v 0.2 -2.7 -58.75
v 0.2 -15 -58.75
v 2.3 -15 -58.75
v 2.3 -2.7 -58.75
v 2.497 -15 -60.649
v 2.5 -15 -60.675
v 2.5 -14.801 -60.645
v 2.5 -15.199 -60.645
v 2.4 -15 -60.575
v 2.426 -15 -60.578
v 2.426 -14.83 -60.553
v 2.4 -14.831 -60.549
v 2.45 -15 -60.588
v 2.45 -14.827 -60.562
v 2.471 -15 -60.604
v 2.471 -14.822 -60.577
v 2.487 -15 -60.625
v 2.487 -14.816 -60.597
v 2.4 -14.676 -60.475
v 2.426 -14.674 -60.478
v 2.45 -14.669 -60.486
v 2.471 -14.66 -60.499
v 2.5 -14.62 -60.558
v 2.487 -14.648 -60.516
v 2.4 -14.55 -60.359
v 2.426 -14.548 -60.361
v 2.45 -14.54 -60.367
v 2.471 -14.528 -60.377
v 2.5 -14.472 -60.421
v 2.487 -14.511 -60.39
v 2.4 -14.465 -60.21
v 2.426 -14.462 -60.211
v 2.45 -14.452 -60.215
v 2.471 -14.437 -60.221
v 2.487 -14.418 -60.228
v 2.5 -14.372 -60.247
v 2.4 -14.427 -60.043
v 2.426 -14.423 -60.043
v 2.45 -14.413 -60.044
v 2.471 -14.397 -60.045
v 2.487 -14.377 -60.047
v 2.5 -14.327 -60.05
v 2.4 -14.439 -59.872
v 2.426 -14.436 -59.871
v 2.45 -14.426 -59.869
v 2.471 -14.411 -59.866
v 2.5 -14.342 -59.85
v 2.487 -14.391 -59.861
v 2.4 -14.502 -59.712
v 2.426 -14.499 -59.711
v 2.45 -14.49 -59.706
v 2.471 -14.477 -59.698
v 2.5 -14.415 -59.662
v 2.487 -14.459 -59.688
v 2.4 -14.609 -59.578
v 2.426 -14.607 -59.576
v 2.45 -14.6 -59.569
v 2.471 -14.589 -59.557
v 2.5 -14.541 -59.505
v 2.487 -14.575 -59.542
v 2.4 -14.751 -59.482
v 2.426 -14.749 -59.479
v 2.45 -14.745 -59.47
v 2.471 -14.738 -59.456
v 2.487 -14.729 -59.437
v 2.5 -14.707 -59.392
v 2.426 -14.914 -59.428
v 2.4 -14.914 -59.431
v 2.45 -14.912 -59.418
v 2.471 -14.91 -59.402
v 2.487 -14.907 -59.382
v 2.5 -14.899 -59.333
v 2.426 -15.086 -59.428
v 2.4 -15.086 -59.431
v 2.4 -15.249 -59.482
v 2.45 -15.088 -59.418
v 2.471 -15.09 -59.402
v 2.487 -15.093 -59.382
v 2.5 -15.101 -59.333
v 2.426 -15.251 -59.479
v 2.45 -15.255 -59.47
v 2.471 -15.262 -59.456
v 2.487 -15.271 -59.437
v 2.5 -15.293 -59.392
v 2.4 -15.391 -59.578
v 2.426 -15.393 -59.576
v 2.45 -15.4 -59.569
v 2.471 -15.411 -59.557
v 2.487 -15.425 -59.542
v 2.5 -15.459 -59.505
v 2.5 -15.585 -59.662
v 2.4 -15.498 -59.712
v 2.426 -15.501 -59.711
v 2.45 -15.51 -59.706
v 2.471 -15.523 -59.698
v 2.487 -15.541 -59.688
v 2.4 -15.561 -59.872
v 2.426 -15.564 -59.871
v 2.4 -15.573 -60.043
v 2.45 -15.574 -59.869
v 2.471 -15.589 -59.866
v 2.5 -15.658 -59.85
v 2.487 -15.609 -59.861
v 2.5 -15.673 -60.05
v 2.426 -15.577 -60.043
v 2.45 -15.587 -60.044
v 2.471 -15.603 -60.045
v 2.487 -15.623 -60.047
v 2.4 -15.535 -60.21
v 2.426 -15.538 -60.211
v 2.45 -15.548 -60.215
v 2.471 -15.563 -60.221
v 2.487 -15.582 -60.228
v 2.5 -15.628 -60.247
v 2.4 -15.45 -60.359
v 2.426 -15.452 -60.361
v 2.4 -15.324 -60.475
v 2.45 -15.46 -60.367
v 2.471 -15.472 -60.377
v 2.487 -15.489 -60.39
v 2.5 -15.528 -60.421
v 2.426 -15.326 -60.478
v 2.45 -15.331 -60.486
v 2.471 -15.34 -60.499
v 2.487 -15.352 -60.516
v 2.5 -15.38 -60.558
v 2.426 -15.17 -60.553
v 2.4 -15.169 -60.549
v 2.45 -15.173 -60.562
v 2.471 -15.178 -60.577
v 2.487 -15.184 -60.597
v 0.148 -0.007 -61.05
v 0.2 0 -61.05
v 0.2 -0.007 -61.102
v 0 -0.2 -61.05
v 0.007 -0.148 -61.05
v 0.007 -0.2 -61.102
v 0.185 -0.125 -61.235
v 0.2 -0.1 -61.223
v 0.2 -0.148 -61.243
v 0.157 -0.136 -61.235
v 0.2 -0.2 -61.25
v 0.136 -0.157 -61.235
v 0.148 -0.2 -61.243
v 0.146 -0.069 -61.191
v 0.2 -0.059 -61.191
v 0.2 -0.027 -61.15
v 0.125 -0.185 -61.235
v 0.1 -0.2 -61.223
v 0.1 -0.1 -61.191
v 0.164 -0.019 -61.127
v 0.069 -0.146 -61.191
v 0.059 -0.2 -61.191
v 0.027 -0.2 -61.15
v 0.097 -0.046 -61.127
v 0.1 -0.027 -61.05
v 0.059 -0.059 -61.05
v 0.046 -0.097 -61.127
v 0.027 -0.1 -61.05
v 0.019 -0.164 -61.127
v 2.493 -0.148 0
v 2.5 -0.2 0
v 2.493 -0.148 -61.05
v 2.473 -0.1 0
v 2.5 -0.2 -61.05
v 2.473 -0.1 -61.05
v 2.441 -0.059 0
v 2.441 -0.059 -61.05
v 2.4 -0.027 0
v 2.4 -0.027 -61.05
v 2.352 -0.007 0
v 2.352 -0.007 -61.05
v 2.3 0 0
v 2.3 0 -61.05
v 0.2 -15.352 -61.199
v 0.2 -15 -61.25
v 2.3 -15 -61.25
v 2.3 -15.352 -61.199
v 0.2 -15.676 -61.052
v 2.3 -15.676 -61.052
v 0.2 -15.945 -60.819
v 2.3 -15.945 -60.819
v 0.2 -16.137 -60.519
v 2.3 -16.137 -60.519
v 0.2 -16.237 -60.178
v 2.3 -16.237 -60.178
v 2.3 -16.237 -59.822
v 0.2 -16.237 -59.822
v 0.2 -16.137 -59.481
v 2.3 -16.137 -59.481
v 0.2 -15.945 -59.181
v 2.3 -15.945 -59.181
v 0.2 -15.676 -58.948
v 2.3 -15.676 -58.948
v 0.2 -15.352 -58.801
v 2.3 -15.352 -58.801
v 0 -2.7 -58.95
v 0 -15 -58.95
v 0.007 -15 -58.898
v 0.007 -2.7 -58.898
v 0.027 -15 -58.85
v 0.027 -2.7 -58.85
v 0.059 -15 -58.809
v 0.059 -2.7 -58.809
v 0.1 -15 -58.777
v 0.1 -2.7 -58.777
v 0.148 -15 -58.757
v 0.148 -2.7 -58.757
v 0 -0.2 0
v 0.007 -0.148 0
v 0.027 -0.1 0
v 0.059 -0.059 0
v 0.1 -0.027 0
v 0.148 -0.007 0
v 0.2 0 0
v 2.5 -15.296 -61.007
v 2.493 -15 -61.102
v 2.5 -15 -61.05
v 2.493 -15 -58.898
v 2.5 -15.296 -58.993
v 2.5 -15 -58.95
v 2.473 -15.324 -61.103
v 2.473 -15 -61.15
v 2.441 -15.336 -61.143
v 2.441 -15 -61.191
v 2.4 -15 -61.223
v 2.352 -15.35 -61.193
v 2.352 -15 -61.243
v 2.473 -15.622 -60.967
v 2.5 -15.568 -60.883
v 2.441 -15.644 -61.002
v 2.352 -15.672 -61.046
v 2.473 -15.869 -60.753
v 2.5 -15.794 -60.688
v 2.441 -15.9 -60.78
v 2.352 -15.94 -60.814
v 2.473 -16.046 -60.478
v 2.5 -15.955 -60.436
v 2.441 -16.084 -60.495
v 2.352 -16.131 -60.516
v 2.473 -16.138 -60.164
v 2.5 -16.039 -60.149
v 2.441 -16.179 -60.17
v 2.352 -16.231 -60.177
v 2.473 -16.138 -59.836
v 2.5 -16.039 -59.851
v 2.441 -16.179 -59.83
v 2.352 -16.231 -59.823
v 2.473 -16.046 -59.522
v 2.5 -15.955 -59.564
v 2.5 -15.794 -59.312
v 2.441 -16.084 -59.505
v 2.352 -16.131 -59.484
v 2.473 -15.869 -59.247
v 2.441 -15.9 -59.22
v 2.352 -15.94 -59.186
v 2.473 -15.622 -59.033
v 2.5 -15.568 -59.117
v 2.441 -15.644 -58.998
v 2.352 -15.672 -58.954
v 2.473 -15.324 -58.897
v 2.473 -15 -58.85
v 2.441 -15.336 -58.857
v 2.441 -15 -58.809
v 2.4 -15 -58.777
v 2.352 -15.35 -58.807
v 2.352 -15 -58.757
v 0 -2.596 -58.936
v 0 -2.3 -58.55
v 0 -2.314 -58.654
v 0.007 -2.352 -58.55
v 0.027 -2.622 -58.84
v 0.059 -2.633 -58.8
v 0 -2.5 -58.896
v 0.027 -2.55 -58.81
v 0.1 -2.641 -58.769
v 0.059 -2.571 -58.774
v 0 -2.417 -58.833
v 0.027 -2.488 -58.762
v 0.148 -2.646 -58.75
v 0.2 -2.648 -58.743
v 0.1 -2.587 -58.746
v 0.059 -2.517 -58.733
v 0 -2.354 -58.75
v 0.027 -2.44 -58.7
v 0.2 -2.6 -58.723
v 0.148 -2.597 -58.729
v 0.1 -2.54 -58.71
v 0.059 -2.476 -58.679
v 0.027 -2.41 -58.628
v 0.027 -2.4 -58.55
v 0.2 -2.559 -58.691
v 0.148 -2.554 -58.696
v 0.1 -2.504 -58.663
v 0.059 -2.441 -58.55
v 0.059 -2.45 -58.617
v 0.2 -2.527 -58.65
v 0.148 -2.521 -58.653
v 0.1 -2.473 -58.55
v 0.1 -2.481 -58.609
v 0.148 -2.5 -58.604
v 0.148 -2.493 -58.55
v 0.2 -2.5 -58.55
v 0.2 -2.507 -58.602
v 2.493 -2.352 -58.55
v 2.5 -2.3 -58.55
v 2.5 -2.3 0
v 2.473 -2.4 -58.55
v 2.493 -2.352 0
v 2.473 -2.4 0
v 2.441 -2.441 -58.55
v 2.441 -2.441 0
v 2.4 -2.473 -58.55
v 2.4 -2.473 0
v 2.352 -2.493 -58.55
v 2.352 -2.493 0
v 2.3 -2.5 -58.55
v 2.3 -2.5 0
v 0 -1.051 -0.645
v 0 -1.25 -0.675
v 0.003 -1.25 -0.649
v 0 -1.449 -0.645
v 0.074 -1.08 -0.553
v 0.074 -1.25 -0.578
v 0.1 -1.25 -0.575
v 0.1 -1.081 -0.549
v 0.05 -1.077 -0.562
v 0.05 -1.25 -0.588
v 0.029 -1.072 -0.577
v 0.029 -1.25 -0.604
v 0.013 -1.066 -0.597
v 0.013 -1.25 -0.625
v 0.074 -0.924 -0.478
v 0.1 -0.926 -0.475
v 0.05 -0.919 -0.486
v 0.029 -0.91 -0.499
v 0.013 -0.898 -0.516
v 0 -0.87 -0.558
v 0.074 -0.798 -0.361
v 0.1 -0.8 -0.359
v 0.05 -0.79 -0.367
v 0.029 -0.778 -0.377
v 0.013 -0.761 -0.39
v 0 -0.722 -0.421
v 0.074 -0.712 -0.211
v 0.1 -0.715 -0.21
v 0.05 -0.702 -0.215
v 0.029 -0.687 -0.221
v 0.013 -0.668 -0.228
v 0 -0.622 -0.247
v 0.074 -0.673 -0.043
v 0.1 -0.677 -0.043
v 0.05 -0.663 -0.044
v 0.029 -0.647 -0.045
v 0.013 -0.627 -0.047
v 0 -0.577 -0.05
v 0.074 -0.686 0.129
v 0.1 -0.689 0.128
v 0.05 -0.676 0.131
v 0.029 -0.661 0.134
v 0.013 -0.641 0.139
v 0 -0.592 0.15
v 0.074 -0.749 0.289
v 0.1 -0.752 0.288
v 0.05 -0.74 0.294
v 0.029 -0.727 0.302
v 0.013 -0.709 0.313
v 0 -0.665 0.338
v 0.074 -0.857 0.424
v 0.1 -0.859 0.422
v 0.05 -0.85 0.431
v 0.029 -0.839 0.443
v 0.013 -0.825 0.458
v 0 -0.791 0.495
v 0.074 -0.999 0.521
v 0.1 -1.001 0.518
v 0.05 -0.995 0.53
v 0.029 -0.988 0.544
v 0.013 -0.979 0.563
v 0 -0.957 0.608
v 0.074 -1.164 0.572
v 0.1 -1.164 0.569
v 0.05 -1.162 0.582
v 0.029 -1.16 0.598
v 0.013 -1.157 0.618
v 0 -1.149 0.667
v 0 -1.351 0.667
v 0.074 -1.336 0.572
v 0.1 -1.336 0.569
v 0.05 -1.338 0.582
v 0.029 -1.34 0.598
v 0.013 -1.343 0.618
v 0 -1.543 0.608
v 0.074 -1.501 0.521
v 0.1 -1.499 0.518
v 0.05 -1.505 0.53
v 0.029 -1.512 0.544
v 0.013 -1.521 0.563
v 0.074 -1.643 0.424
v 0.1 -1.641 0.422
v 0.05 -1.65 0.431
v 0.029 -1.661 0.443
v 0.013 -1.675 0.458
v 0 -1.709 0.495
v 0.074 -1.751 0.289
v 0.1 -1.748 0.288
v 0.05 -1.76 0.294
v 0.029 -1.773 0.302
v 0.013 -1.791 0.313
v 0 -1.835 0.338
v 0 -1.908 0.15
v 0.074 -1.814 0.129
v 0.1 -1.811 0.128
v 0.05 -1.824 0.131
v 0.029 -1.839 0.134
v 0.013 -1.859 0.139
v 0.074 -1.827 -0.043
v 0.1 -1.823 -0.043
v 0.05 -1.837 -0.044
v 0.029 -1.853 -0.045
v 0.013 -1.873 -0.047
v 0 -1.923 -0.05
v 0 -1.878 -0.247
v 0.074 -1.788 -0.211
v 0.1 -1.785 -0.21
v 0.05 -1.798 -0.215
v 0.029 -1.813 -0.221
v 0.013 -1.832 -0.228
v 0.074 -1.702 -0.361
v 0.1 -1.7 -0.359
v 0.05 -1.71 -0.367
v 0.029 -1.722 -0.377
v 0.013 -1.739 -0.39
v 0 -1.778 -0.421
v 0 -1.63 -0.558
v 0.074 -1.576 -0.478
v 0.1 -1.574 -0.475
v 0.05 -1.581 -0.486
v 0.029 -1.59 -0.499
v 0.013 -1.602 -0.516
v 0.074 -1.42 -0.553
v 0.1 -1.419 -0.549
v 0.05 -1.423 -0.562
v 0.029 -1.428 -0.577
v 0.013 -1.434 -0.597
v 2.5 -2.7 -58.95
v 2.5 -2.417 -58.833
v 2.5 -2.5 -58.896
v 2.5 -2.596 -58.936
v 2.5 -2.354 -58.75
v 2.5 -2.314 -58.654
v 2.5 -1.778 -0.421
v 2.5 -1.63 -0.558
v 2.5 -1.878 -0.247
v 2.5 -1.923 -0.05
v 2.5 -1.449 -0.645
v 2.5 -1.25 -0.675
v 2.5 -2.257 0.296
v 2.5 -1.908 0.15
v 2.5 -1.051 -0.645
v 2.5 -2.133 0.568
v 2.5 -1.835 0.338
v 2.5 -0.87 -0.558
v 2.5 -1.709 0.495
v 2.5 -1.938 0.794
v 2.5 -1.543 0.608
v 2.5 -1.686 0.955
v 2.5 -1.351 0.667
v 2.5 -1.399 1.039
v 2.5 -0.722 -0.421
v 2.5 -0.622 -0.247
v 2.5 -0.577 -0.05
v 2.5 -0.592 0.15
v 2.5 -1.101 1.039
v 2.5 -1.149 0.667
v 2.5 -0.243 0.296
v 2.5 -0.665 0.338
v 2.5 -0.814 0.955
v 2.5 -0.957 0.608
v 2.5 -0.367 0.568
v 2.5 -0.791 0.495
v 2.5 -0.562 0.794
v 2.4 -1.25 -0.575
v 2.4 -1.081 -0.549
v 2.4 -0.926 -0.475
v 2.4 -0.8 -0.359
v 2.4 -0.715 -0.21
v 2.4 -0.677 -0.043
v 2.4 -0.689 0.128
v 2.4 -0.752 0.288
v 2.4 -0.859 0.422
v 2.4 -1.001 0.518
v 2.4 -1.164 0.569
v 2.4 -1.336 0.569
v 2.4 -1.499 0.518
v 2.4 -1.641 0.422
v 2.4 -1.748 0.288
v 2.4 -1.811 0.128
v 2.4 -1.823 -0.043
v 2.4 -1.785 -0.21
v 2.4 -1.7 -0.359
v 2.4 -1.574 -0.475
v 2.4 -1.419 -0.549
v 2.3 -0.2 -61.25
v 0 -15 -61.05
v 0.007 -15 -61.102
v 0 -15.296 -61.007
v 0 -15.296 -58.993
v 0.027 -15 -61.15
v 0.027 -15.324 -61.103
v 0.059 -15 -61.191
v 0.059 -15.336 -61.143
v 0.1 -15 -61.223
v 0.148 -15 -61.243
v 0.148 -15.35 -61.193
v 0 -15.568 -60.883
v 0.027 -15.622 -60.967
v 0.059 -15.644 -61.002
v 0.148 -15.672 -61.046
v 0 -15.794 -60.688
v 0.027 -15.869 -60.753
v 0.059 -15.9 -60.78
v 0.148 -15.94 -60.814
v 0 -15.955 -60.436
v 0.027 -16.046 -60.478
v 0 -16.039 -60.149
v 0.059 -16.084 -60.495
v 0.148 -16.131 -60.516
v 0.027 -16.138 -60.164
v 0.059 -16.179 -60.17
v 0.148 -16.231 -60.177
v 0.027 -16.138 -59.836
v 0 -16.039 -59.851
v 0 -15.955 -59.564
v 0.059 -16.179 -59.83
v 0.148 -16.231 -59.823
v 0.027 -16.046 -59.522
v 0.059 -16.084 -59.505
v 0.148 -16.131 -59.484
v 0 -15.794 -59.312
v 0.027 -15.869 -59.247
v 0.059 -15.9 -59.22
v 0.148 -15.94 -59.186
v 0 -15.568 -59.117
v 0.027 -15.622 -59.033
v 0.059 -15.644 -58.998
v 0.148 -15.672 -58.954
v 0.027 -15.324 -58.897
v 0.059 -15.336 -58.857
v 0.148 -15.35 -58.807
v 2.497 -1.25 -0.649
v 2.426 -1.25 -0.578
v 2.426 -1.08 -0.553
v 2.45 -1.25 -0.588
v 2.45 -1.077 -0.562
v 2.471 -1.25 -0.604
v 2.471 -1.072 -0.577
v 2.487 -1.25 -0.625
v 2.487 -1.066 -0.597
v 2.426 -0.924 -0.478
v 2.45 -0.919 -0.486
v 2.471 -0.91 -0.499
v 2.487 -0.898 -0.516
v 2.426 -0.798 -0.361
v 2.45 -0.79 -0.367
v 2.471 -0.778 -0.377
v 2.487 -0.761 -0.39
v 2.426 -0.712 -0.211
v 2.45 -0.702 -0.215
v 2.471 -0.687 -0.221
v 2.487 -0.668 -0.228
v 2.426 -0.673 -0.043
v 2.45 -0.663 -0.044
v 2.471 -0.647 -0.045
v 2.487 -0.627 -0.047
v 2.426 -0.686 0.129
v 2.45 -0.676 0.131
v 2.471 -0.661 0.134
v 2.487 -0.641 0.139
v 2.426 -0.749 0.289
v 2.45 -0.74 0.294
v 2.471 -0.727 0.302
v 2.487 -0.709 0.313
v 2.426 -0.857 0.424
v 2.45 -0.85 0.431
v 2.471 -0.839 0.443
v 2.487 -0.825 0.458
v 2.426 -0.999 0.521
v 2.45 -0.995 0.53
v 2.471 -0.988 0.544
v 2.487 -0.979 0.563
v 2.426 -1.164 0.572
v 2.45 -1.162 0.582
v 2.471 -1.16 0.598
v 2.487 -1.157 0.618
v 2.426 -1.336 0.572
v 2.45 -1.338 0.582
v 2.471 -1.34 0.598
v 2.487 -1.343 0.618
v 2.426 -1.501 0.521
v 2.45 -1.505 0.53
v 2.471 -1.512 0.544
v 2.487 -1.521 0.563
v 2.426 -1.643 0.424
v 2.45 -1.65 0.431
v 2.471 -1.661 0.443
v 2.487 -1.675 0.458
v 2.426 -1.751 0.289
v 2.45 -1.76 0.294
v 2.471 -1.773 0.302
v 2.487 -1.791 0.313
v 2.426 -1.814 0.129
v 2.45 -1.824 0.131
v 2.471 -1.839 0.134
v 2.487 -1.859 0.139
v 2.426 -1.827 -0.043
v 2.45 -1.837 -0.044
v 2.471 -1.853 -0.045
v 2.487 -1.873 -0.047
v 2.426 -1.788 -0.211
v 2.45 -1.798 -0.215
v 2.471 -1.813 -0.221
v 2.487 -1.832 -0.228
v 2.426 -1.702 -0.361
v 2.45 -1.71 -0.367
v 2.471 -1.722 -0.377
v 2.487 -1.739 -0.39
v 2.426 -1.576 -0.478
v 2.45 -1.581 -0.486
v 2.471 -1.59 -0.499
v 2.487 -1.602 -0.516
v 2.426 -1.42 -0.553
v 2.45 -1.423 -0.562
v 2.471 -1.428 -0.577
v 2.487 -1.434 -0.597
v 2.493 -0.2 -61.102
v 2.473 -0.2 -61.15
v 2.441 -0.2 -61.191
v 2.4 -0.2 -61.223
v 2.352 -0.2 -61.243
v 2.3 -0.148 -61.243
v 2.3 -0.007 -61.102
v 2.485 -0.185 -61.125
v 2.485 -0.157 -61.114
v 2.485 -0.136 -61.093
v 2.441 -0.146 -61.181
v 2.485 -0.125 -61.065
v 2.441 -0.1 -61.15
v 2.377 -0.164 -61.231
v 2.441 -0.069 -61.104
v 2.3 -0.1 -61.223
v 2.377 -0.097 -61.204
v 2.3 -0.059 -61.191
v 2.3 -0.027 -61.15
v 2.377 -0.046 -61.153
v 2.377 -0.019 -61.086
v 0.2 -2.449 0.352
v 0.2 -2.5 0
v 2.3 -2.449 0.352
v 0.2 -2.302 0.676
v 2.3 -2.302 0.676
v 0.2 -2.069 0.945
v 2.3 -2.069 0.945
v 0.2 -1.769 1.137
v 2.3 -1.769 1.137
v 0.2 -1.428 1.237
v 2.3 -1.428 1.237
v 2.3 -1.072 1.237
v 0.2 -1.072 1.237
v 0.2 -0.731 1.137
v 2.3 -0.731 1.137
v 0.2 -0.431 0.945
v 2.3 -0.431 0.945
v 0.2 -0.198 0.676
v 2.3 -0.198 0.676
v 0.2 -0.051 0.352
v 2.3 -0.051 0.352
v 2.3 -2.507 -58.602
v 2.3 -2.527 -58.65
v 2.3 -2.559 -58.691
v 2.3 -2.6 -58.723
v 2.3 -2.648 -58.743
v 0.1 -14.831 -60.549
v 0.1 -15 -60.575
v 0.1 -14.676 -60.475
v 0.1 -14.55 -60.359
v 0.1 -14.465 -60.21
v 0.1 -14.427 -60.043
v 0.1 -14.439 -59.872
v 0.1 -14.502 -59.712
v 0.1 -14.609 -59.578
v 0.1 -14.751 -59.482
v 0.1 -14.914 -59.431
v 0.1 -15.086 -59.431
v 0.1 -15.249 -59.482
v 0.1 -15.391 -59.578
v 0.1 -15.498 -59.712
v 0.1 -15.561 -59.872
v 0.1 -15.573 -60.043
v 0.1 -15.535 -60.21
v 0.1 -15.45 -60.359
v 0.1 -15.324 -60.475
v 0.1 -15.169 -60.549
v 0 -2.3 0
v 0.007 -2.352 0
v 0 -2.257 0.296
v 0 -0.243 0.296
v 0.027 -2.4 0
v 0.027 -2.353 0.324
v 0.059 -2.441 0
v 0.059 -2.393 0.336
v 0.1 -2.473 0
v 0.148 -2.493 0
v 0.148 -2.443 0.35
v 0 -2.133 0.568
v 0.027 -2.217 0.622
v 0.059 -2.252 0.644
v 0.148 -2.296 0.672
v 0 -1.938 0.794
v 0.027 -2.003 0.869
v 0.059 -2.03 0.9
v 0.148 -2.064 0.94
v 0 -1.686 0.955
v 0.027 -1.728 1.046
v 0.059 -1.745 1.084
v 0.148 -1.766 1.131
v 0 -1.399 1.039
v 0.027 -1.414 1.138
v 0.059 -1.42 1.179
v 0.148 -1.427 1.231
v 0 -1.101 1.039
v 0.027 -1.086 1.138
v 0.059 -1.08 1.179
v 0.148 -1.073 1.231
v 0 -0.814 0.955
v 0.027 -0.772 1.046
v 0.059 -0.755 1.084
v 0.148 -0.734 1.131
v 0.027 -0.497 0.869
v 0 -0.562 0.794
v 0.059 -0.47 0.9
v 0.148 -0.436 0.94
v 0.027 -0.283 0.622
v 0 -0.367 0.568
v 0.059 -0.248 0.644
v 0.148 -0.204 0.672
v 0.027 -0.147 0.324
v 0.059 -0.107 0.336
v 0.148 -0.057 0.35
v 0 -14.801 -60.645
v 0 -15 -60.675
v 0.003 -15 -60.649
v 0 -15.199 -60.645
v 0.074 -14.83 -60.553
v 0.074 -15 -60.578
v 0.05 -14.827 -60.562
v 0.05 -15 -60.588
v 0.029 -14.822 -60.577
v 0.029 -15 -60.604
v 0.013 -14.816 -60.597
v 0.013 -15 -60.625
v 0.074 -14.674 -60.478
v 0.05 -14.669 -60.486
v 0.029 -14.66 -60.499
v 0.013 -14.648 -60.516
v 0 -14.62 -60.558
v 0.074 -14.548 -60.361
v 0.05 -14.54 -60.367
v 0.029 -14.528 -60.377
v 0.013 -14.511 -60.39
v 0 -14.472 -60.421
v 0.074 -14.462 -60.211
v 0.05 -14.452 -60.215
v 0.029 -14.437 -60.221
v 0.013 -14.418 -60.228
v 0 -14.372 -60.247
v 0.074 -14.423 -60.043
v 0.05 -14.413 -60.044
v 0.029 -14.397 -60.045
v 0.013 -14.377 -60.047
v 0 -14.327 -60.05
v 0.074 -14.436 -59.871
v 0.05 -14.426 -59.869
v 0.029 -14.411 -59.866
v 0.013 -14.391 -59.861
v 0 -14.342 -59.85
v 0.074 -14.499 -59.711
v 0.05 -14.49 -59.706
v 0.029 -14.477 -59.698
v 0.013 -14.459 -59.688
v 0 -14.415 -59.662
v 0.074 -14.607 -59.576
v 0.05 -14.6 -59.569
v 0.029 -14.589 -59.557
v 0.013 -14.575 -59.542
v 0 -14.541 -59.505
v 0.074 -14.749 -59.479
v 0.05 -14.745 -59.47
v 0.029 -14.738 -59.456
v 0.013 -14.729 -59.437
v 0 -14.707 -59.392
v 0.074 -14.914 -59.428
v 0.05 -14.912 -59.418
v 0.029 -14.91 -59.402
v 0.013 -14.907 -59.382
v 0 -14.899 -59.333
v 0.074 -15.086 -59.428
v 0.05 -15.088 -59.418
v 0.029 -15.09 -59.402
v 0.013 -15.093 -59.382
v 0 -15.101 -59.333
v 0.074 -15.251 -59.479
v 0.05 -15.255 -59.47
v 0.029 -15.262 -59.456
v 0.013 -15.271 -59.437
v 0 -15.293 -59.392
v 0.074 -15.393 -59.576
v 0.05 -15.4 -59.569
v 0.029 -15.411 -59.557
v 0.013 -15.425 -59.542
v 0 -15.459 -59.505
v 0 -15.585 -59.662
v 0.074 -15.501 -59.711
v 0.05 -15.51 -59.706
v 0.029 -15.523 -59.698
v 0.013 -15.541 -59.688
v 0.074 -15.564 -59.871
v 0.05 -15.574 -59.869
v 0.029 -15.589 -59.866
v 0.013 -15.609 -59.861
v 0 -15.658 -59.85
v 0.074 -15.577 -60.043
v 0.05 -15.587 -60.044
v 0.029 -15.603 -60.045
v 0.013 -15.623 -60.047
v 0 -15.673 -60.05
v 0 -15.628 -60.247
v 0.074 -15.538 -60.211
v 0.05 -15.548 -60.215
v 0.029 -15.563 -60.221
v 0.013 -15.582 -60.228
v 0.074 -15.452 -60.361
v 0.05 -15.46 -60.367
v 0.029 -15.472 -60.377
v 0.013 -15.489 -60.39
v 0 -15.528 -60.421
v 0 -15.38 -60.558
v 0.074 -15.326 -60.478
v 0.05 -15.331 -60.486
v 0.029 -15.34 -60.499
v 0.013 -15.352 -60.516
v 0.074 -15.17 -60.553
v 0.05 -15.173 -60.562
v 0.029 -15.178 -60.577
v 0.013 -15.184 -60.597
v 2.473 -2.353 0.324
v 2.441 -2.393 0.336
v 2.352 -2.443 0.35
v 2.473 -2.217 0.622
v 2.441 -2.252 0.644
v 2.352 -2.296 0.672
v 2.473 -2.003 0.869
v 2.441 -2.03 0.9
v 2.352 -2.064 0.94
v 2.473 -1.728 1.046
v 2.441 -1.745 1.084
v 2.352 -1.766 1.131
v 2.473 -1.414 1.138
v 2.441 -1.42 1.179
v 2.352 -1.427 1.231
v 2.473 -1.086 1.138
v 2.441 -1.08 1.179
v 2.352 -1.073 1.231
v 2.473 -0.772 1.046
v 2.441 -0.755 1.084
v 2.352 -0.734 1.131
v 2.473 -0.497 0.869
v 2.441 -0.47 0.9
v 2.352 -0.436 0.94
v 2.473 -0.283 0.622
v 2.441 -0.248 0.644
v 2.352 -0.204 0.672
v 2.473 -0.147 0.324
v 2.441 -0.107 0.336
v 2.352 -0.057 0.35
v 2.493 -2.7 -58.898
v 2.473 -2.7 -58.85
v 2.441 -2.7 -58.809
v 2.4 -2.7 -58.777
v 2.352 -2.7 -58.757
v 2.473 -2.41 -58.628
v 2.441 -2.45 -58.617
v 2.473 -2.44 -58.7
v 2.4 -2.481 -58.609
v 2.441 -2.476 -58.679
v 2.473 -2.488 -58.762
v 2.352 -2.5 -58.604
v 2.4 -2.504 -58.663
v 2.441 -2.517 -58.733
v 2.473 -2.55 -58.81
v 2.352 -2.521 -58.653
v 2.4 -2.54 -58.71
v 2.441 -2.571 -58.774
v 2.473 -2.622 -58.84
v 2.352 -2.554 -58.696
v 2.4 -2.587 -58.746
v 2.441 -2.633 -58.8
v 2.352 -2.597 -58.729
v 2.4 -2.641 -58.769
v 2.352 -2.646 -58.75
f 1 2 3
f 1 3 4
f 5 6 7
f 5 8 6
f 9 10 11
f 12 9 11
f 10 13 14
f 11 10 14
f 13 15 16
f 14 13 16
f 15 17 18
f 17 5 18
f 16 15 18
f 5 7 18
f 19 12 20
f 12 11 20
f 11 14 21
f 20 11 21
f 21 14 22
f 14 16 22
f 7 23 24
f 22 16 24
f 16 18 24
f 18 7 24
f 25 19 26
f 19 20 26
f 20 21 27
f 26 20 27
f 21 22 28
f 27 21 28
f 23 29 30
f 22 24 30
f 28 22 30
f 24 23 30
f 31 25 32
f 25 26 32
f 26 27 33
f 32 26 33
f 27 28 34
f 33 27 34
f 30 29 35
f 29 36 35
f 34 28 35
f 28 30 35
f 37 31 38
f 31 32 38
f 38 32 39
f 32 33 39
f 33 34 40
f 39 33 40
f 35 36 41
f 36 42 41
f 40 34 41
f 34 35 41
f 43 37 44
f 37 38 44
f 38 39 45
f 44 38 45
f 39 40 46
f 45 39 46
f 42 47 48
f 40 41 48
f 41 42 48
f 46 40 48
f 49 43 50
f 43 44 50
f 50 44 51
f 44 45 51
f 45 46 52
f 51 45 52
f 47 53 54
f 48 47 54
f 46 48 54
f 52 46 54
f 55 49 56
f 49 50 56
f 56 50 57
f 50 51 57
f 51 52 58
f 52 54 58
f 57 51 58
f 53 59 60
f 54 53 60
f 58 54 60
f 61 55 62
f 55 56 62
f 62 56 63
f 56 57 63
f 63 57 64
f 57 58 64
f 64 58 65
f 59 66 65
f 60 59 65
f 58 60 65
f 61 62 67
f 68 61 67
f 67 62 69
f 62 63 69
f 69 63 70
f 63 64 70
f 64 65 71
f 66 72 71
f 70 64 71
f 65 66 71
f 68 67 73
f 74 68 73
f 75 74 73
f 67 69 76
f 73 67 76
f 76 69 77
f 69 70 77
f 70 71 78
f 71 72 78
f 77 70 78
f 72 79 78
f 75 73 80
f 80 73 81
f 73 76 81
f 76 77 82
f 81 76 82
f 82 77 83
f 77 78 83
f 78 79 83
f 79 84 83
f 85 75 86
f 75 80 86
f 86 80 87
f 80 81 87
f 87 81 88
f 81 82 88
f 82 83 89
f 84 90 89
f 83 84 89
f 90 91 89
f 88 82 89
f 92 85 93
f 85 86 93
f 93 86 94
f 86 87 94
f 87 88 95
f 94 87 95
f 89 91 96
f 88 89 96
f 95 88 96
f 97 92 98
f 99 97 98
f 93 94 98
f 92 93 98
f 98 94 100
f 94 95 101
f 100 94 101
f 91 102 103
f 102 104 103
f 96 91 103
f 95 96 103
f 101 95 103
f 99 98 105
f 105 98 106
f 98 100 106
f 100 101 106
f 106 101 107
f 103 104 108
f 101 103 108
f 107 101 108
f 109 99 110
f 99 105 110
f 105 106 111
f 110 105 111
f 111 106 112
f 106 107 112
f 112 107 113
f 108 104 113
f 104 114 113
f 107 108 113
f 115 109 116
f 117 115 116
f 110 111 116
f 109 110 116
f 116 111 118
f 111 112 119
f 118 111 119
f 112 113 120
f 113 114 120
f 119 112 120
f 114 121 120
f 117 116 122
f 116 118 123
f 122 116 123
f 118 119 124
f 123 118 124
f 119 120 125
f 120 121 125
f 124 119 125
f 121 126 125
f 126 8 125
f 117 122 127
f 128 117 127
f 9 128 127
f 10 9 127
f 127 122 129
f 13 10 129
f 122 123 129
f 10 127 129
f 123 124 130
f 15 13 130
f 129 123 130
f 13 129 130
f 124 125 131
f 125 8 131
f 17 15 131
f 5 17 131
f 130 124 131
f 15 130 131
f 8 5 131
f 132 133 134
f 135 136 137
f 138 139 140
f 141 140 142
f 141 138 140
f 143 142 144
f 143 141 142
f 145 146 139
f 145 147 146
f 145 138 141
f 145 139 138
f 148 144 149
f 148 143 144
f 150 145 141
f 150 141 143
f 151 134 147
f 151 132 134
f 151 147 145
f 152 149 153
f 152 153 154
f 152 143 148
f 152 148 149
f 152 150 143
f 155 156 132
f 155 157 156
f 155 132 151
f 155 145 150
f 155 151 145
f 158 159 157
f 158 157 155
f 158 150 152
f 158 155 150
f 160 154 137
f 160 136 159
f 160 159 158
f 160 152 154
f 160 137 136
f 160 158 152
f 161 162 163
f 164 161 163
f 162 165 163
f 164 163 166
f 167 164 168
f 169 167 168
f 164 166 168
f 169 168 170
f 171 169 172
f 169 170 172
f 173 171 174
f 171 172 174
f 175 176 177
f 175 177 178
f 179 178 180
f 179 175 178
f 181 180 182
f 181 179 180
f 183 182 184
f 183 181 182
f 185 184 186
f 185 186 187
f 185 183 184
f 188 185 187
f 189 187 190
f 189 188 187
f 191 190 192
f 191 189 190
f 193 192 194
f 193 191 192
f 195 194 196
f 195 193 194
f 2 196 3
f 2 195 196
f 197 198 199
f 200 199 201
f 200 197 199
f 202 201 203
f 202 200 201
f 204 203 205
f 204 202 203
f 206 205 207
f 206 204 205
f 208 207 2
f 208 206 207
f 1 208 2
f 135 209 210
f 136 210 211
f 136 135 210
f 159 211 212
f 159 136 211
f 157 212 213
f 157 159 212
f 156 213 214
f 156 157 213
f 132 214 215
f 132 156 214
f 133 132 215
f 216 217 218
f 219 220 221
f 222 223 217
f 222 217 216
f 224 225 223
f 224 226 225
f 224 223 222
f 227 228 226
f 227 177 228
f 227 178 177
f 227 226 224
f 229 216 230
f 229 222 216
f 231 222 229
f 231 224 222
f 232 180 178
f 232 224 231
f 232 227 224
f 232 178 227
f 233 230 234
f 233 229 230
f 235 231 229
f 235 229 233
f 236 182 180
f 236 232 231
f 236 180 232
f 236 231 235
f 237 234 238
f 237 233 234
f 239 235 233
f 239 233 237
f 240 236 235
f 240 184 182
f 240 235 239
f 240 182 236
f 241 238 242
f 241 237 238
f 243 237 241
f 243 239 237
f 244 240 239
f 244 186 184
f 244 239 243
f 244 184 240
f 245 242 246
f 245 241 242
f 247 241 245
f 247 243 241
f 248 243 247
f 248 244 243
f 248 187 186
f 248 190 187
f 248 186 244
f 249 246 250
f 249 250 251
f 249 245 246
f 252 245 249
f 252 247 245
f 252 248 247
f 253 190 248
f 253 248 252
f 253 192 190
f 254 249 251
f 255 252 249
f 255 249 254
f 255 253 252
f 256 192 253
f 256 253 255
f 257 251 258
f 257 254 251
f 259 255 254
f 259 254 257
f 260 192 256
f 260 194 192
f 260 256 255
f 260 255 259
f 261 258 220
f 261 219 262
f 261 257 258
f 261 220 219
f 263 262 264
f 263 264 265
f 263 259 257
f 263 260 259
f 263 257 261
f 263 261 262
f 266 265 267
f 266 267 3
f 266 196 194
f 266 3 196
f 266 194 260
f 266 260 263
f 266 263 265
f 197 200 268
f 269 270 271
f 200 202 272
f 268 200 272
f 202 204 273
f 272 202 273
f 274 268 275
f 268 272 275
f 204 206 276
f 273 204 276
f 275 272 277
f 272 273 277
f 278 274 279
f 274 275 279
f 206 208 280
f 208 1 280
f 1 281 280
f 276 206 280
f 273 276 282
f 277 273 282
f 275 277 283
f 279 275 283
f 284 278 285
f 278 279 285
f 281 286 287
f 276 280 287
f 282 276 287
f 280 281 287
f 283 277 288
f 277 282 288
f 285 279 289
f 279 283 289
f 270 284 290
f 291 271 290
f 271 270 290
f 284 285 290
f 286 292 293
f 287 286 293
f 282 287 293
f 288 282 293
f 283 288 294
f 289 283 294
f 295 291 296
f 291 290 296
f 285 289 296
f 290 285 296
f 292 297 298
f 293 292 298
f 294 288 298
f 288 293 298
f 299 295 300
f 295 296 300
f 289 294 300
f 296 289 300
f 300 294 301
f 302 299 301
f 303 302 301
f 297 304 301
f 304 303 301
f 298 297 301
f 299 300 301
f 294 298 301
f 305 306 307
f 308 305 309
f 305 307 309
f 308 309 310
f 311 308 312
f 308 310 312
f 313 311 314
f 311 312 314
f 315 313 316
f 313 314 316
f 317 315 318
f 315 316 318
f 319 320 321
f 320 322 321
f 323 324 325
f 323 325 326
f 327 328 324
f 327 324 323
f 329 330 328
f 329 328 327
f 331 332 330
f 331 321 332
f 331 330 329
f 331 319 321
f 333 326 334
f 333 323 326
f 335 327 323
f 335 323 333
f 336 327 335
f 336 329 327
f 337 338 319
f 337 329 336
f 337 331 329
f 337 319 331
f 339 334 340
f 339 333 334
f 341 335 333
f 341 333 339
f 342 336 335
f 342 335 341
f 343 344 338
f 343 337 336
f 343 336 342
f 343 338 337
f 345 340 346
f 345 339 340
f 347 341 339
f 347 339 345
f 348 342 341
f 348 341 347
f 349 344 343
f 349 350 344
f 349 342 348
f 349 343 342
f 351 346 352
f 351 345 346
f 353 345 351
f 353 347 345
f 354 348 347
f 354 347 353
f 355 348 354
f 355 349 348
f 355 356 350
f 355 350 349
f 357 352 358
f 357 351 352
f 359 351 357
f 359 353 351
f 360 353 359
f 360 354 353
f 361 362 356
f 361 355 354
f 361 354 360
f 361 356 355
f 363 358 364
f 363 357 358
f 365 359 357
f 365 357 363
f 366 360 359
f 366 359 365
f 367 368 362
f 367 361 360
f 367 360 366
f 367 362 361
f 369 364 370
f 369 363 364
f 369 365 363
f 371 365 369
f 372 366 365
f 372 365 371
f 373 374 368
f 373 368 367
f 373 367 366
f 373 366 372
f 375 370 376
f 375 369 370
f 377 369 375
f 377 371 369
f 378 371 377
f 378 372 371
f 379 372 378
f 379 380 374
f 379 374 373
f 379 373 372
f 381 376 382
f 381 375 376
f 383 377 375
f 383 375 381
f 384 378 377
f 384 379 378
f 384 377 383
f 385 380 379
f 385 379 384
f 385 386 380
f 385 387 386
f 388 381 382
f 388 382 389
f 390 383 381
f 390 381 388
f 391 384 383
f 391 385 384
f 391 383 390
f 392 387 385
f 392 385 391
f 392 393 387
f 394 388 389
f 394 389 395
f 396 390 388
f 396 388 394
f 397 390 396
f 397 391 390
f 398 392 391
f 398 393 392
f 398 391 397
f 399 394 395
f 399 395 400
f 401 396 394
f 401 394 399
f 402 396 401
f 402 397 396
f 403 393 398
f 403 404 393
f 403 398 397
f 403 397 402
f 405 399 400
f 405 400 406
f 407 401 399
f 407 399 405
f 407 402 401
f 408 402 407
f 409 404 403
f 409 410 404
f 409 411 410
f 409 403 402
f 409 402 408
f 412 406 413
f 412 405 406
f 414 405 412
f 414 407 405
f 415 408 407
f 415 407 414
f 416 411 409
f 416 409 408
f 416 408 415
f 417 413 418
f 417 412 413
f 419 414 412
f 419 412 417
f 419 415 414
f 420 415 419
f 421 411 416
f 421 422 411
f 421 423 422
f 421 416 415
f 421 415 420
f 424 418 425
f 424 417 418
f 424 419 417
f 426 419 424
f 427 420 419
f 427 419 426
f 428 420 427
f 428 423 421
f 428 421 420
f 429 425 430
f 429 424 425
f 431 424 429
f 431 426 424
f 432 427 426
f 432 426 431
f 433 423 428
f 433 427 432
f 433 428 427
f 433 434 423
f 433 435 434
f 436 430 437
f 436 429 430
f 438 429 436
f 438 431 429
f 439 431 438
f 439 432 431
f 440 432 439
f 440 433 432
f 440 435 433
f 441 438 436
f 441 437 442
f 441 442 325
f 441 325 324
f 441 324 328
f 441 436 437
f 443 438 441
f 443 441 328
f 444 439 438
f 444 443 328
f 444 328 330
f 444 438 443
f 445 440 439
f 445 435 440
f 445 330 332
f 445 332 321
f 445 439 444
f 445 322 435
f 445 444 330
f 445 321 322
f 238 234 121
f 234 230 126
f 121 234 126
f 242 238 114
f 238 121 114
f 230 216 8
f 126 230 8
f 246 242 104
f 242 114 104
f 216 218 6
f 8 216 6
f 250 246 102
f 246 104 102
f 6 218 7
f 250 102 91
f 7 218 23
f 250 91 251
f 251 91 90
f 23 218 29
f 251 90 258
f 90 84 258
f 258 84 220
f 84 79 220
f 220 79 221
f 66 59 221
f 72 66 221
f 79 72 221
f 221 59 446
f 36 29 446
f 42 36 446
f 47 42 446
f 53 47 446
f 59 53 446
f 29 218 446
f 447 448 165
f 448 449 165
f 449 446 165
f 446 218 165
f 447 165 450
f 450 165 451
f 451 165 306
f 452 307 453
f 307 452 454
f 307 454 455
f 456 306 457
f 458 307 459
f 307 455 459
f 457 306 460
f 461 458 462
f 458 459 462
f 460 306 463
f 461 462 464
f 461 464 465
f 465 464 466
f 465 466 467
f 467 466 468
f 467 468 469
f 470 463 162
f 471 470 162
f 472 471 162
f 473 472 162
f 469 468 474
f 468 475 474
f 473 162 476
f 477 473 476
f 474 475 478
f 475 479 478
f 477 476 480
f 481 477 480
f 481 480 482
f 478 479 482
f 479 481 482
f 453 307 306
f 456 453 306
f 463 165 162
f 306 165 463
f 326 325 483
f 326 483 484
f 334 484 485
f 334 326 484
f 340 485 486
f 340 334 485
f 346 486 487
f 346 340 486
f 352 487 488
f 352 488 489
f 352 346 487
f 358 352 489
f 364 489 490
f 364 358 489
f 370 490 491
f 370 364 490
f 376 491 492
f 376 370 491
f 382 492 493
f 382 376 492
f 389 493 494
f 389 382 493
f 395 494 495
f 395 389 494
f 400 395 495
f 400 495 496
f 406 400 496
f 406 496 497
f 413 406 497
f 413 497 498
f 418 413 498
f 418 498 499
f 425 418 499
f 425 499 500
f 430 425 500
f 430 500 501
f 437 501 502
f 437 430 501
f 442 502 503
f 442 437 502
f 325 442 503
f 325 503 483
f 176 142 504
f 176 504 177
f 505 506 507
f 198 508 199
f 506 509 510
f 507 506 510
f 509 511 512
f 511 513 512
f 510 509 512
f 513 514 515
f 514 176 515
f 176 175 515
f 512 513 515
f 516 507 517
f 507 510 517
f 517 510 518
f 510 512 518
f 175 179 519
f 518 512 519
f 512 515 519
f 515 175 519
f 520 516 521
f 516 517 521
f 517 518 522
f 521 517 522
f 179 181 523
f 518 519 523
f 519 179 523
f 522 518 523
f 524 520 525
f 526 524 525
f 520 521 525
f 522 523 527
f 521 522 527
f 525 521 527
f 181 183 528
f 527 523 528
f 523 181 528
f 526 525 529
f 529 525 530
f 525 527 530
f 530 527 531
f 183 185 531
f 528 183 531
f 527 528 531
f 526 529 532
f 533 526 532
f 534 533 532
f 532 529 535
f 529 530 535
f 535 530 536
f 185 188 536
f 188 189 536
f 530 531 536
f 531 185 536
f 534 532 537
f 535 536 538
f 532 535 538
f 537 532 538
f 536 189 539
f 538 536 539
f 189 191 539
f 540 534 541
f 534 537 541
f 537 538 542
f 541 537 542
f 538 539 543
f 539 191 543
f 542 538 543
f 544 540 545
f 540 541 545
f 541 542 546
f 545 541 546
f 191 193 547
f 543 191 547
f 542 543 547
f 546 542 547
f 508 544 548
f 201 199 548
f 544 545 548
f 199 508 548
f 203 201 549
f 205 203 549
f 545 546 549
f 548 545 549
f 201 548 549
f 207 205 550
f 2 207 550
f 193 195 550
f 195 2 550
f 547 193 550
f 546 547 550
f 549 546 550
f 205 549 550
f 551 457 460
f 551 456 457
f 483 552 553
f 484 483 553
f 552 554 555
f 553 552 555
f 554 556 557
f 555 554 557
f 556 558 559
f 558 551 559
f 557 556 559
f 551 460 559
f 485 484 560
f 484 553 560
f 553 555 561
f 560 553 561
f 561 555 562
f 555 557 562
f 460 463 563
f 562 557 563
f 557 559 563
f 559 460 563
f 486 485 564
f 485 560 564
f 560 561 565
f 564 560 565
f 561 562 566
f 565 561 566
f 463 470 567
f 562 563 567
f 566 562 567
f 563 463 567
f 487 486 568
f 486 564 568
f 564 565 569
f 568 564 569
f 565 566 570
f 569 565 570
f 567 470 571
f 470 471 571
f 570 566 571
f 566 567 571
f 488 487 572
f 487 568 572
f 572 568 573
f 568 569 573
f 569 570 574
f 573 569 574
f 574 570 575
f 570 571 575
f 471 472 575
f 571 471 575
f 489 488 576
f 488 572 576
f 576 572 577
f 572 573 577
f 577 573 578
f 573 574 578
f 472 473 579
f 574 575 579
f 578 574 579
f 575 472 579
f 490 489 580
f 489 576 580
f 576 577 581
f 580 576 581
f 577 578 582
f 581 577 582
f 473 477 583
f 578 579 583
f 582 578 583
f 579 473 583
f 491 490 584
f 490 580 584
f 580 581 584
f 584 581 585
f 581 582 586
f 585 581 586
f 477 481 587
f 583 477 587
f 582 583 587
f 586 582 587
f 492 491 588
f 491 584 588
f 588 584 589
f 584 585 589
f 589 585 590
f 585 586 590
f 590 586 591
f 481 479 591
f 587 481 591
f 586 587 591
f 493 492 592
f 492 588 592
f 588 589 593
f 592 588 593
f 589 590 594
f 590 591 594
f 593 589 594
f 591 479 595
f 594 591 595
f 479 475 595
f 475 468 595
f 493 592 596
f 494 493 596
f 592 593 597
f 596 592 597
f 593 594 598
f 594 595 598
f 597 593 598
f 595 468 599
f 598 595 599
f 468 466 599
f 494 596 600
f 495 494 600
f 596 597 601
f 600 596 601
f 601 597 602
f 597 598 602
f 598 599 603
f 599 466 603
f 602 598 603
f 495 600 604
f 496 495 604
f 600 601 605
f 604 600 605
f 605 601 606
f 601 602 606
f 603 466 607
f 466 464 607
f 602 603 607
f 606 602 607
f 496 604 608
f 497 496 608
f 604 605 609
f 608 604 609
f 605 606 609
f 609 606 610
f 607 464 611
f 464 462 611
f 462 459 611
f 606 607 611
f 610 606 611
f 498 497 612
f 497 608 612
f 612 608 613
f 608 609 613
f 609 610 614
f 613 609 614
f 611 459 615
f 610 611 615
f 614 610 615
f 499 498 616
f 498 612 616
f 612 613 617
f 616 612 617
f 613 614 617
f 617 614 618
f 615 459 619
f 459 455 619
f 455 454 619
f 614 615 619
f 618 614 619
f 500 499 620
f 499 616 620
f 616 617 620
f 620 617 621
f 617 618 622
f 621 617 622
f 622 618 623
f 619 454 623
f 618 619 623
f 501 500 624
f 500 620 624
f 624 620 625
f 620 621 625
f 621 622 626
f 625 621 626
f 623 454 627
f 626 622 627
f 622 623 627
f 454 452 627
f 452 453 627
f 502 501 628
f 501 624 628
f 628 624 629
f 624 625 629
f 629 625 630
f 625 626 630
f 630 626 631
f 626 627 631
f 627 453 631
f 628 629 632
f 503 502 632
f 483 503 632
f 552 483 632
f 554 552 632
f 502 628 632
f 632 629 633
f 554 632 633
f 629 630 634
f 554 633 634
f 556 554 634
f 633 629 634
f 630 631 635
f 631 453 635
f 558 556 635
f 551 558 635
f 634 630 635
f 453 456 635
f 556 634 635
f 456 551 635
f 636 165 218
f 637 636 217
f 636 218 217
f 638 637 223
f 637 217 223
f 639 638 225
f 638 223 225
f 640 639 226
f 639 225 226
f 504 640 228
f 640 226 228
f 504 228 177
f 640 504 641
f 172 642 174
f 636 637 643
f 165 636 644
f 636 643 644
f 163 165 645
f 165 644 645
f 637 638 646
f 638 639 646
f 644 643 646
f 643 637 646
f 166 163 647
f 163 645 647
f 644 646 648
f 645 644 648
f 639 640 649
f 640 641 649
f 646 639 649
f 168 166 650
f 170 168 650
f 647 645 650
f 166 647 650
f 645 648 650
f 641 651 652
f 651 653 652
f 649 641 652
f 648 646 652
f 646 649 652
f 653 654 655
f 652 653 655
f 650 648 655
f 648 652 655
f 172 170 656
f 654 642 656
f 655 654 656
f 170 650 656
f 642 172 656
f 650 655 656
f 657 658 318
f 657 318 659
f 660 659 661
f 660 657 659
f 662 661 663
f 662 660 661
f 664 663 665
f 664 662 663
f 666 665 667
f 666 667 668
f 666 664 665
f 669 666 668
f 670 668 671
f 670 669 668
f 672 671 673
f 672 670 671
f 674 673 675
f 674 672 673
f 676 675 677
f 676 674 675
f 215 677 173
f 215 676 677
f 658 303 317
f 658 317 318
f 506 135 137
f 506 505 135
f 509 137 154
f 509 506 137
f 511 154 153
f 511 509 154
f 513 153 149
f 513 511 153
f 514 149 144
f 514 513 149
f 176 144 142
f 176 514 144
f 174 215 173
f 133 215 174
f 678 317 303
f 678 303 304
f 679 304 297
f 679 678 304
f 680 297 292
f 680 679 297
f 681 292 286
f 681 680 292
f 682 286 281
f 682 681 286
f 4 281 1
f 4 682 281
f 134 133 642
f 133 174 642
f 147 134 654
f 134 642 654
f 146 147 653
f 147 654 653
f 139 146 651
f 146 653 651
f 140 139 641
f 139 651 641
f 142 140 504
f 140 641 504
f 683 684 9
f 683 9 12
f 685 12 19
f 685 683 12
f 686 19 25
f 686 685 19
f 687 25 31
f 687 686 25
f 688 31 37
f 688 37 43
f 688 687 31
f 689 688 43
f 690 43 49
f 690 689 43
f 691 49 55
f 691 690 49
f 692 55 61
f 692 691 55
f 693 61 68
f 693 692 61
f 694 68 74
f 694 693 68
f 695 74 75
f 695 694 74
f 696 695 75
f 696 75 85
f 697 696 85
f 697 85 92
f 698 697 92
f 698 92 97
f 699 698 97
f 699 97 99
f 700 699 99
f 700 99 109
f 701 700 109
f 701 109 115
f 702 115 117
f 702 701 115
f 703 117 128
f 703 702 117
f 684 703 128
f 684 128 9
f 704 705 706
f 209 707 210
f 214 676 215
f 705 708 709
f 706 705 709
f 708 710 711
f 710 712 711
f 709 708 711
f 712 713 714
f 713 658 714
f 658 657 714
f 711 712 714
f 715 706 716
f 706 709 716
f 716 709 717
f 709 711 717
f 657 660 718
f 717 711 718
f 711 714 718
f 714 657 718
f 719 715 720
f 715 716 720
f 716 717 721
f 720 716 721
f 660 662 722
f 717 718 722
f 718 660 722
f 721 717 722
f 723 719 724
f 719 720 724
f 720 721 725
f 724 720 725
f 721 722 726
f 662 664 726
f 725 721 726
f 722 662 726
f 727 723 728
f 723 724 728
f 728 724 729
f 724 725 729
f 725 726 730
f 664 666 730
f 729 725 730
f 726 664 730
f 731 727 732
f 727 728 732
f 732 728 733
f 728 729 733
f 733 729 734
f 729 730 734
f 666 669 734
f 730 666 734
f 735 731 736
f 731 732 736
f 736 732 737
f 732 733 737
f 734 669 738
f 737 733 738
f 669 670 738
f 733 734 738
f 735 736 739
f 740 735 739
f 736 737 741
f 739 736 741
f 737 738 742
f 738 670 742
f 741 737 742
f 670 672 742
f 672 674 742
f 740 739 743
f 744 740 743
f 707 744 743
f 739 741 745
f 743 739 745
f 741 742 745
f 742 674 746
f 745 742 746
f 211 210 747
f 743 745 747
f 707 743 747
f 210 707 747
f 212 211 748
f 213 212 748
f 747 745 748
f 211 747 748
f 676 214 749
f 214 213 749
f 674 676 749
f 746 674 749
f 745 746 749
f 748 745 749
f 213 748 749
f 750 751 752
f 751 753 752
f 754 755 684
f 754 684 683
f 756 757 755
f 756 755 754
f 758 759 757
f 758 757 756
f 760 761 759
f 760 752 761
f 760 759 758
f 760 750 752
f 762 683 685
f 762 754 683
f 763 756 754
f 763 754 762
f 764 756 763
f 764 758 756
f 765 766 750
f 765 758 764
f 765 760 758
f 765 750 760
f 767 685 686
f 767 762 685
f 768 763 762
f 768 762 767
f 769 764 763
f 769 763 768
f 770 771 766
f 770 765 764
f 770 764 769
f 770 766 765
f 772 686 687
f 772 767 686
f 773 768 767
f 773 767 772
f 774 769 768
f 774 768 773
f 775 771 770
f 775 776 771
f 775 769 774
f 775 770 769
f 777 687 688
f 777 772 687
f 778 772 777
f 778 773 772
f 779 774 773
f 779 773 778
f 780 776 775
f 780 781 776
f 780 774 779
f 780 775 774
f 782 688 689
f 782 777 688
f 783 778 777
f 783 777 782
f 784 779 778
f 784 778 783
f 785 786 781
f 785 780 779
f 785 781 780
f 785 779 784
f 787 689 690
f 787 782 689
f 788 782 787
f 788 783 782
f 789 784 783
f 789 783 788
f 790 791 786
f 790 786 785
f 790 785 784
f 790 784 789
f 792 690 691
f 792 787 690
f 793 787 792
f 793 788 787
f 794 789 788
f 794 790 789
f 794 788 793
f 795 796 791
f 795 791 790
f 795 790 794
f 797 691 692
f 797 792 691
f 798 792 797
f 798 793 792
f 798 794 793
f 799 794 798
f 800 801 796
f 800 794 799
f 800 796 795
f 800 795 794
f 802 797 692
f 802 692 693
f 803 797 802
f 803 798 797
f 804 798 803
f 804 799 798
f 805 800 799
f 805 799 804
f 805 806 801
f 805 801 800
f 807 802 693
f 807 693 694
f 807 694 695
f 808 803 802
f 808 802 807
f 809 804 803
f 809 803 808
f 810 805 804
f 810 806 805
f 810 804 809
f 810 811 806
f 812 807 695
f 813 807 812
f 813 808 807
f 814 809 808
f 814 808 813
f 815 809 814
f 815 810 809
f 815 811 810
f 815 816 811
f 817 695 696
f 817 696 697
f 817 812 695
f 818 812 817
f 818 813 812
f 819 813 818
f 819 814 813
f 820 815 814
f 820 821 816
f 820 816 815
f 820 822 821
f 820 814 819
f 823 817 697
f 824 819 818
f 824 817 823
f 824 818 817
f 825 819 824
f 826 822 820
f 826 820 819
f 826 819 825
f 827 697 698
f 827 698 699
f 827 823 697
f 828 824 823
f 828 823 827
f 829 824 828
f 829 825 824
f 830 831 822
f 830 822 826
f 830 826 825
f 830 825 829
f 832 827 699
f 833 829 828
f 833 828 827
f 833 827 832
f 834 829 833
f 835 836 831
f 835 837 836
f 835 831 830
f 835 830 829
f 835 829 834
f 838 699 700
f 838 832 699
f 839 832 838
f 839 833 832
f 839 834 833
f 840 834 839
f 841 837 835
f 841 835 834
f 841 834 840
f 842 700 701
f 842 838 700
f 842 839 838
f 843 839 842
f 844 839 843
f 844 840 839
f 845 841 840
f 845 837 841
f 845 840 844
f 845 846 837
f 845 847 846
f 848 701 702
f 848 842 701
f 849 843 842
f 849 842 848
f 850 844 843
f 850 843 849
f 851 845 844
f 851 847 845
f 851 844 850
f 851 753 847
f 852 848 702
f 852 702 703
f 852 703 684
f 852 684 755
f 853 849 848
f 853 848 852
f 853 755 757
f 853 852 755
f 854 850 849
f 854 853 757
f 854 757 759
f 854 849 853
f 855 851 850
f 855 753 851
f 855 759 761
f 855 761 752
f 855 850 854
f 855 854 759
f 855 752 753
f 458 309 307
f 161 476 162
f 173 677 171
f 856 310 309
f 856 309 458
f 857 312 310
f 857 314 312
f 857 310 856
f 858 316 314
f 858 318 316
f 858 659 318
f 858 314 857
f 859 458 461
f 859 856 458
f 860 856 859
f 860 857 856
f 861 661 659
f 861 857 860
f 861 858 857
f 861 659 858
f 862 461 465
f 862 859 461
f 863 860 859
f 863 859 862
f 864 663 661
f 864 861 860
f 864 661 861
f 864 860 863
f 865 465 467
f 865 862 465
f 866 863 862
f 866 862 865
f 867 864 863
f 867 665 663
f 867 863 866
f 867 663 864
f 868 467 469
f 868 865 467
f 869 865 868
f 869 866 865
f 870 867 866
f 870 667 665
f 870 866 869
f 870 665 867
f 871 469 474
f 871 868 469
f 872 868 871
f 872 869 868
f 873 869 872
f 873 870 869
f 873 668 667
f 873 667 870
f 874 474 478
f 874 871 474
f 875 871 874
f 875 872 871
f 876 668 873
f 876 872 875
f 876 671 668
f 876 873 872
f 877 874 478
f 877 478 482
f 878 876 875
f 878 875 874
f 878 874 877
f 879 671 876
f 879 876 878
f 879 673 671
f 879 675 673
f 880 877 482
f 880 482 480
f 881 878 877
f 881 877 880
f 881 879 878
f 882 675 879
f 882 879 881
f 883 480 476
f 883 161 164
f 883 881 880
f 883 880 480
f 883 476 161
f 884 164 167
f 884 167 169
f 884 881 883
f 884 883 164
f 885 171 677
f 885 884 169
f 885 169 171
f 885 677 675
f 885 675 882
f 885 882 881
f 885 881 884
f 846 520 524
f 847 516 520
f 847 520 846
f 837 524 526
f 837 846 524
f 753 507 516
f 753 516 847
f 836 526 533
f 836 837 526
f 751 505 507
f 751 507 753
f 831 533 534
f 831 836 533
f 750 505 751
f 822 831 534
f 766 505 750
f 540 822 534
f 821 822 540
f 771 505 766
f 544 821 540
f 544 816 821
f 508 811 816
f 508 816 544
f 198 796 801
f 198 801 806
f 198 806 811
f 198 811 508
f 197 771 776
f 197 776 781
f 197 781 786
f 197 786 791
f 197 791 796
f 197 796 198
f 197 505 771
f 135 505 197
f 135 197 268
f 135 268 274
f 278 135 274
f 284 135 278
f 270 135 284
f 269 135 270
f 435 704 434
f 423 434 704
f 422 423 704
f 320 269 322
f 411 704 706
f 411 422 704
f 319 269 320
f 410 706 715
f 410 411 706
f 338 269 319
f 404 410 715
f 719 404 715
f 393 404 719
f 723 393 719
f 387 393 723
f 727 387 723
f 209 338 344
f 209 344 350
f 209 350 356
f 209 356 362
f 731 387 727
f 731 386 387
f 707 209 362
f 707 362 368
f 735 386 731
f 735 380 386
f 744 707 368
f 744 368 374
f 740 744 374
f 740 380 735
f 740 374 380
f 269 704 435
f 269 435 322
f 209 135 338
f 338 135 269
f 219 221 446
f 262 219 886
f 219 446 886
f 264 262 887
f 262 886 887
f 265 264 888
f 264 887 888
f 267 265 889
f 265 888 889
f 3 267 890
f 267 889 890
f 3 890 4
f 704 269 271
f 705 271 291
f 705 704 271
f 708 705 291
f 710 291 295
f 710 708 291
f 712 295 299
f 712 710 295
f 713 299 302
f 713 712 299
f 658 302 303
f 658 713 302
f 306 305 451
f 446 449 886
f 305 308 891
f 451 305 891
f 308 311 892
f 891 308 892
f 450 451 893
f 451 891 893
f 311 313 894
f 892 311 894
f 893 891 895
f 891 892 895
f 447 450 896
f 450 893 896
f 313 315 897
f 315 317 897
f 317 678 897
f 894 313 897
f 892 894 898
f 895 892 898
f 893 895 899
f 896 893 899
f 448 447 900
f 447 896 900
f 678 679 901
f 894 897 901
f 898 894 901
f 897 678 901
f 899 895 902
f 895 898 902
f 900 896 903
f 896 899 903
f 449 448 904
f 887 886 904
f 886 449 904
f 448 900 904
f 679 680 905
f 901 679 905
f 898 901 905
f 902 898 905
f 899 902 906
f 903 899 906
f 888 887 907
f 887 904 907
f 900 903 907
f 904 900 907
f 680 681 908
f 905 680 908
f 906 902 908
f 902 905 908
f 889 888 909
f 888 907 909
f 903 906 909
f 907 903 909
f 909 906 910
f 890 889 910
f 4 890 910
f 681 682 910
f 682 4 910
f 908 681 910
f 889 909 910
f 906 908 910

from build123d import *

# Parameters (mm, degrees)
SKETCH1_R           = 0.575
BOSS_EXTRUDE1_DEPTH = 2.5
FILLET2_R           = 0.1
FILLET3_R           = 0.2


with BuildPart() as part:
    # Sketch1 → Boss-Extrude1 (new body)
    with BuildSketch(Plane(origin=(0, 0, 0), x_dir=(0, 0, -1), z_dir=(1, 0, 0))):
        with BuildLine():
            Line((0, 0), (60, 0))
            Line((60, 0), (61.25, 0))
            Line((61.25, 0), (61.25, -15))
            ThreePointArc((61.25, -15), (60, -16.25), (58.75, -15))
            Line((58.75, -15), (58.75, -2.5))
            Line((58.75, -2.5), (0, -2.5))
            ThreePointArc((0, -2.5), (-1.25, -1.25), (0, 0))
        make_face()
        with Locations((0, -1.25)):
            Circle(SKETCH1_R, mode=Mode.SUBTRACT)
        with Locations((60, -15)):
            Circle(SKETCH1_R, mode=Mode.SUBTRACT)
    extrude(amount=BOSS_EXTRUDE1_DEPTH)

    # Fillet2
    fillet2_edges = [part.edges().sort_by_distance(p)[0] for p in [
        (0, -1.25, 0.575),
        (2.5, -1.25, 0.575),
        (0, -15, -59.425),
        (2.5, -15, -59.425),
    ]]
    fillet(fillet2_edges, radius=FILLET2_R)

    # Fillet3
    fillet3_edges = [part.edges().sort_by_distance(p)[0] for p in [
        (0, -1.25, 1.25),
        (1.25, 0, -61.25),
        (2.5, -8.75, -58.75),
        (1.25, -2.5, -58.75),
        (2.5, -16.25, -60),
        (2.5, -7.5, -61.25),
        (2.5, 0, -30.625),
        (2.5, -1.25, 1.25),
        (0, 0, -30.625),
        (0, -7.5, -61.25),
        (0, -16.25, -60),
        (2.5, -2.5, -29.375),
        (0, -8.75, -58.75),
        (0, -2.5, -29.375),
    ]]
    fillet(fillet3_edges, radius=FILLET3_R)


solid = part.part
